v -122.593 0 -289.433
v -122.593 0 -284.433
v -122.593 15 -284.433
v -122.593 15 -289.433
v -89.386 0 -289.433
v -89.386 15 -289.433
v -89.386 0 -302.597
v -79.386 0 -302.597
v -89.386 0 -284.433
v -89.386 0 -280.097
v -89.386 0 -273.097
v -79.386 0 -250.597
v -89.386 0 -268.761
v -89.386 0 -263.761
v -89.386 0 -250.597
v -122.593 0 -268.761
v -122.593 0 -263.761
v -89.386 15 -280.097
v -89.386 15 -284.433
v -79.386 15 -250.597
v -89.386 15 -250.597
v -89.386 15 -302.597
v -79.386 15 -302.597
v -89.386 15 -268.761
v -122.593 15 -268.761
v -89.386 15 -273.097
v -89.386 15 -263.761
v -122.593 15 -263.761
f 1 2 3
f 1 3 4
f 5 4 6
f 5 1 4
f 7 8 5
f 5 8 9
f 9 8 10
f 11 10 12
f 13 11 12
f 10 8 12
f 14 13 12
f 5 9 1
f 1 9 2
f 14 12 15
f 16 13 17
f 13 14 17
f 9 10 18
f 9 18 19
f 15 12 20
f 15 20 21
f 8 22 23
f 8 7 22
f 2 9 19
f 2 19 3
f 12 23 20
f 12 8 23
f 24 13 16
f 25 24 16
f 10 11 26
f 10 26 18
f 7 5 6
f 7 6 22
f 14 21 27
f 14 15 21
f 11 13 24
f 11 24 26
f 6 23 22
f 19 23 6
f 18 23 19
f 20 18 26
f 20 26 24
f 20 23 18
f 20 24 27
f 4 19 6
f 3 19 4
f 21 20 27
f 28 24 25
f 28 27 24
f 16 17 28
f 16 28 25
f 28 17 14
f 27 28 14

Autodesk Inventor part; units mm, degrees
ref_plane "YZ Plane" through (0, 0, 0) normal (1, 0, 0) x (0, 1, 0)
ref_plane "XZ Plane" through (0, 0, 0) normal (0, 1, 0) x (-1, 0, 0)
ref_plane "XY Plane" through (0, 0, 0) normal (0, 0, 1) x (1, 0, 0)
sketch "Esquisse1" plane through (0, 0, 0) normal (0, 1, 0) x (-1, 0, 0)
  line L0 (89.3861, -273.097) -> (89.3861, -280.097)
  line L1 (89.3861, -250.597) -> (89.3861, -263.7609)
  line L2 (89.3861, -302.597) -> (79.3861, -302.597)
  line L3 (79.3861, -302.597) -> (79.3861, -250.597)
  line L4 (122.5932, -263.7609) -> (89.3861, -263.7609)
  line L5 (89.3861, -268.7609) -> (122.5932, -268.7609)
  line L6 (122.5932, -289.4332) -> (89.3861, -289.4332)
  line L7 (89.3861, -284.4332) -> (122.5932, -284.4332)
  line L8 (89.3861, -289.4332) -> (89.3861, -302.597)
  line L9 (89.3861, -268.7609) -> (89.3861, -284.4332)
  line L10 (79.3861, -250.597) -> (89.3861, -250.597)
  line L11 (122.5932, -263.7609) -> (122.5932, -268.7609)
  line L12 (122.5932, -284.4332) -> (122.5932, -289.4332)
  point P0 (0, 0)
  dimension "d0" = 10
  dimension "d1" = 5
  dimension "d2" = 5
extrude "Extrusion1" add sketch "Esquisse1" along normal blind 15
properties part number "haut support"
